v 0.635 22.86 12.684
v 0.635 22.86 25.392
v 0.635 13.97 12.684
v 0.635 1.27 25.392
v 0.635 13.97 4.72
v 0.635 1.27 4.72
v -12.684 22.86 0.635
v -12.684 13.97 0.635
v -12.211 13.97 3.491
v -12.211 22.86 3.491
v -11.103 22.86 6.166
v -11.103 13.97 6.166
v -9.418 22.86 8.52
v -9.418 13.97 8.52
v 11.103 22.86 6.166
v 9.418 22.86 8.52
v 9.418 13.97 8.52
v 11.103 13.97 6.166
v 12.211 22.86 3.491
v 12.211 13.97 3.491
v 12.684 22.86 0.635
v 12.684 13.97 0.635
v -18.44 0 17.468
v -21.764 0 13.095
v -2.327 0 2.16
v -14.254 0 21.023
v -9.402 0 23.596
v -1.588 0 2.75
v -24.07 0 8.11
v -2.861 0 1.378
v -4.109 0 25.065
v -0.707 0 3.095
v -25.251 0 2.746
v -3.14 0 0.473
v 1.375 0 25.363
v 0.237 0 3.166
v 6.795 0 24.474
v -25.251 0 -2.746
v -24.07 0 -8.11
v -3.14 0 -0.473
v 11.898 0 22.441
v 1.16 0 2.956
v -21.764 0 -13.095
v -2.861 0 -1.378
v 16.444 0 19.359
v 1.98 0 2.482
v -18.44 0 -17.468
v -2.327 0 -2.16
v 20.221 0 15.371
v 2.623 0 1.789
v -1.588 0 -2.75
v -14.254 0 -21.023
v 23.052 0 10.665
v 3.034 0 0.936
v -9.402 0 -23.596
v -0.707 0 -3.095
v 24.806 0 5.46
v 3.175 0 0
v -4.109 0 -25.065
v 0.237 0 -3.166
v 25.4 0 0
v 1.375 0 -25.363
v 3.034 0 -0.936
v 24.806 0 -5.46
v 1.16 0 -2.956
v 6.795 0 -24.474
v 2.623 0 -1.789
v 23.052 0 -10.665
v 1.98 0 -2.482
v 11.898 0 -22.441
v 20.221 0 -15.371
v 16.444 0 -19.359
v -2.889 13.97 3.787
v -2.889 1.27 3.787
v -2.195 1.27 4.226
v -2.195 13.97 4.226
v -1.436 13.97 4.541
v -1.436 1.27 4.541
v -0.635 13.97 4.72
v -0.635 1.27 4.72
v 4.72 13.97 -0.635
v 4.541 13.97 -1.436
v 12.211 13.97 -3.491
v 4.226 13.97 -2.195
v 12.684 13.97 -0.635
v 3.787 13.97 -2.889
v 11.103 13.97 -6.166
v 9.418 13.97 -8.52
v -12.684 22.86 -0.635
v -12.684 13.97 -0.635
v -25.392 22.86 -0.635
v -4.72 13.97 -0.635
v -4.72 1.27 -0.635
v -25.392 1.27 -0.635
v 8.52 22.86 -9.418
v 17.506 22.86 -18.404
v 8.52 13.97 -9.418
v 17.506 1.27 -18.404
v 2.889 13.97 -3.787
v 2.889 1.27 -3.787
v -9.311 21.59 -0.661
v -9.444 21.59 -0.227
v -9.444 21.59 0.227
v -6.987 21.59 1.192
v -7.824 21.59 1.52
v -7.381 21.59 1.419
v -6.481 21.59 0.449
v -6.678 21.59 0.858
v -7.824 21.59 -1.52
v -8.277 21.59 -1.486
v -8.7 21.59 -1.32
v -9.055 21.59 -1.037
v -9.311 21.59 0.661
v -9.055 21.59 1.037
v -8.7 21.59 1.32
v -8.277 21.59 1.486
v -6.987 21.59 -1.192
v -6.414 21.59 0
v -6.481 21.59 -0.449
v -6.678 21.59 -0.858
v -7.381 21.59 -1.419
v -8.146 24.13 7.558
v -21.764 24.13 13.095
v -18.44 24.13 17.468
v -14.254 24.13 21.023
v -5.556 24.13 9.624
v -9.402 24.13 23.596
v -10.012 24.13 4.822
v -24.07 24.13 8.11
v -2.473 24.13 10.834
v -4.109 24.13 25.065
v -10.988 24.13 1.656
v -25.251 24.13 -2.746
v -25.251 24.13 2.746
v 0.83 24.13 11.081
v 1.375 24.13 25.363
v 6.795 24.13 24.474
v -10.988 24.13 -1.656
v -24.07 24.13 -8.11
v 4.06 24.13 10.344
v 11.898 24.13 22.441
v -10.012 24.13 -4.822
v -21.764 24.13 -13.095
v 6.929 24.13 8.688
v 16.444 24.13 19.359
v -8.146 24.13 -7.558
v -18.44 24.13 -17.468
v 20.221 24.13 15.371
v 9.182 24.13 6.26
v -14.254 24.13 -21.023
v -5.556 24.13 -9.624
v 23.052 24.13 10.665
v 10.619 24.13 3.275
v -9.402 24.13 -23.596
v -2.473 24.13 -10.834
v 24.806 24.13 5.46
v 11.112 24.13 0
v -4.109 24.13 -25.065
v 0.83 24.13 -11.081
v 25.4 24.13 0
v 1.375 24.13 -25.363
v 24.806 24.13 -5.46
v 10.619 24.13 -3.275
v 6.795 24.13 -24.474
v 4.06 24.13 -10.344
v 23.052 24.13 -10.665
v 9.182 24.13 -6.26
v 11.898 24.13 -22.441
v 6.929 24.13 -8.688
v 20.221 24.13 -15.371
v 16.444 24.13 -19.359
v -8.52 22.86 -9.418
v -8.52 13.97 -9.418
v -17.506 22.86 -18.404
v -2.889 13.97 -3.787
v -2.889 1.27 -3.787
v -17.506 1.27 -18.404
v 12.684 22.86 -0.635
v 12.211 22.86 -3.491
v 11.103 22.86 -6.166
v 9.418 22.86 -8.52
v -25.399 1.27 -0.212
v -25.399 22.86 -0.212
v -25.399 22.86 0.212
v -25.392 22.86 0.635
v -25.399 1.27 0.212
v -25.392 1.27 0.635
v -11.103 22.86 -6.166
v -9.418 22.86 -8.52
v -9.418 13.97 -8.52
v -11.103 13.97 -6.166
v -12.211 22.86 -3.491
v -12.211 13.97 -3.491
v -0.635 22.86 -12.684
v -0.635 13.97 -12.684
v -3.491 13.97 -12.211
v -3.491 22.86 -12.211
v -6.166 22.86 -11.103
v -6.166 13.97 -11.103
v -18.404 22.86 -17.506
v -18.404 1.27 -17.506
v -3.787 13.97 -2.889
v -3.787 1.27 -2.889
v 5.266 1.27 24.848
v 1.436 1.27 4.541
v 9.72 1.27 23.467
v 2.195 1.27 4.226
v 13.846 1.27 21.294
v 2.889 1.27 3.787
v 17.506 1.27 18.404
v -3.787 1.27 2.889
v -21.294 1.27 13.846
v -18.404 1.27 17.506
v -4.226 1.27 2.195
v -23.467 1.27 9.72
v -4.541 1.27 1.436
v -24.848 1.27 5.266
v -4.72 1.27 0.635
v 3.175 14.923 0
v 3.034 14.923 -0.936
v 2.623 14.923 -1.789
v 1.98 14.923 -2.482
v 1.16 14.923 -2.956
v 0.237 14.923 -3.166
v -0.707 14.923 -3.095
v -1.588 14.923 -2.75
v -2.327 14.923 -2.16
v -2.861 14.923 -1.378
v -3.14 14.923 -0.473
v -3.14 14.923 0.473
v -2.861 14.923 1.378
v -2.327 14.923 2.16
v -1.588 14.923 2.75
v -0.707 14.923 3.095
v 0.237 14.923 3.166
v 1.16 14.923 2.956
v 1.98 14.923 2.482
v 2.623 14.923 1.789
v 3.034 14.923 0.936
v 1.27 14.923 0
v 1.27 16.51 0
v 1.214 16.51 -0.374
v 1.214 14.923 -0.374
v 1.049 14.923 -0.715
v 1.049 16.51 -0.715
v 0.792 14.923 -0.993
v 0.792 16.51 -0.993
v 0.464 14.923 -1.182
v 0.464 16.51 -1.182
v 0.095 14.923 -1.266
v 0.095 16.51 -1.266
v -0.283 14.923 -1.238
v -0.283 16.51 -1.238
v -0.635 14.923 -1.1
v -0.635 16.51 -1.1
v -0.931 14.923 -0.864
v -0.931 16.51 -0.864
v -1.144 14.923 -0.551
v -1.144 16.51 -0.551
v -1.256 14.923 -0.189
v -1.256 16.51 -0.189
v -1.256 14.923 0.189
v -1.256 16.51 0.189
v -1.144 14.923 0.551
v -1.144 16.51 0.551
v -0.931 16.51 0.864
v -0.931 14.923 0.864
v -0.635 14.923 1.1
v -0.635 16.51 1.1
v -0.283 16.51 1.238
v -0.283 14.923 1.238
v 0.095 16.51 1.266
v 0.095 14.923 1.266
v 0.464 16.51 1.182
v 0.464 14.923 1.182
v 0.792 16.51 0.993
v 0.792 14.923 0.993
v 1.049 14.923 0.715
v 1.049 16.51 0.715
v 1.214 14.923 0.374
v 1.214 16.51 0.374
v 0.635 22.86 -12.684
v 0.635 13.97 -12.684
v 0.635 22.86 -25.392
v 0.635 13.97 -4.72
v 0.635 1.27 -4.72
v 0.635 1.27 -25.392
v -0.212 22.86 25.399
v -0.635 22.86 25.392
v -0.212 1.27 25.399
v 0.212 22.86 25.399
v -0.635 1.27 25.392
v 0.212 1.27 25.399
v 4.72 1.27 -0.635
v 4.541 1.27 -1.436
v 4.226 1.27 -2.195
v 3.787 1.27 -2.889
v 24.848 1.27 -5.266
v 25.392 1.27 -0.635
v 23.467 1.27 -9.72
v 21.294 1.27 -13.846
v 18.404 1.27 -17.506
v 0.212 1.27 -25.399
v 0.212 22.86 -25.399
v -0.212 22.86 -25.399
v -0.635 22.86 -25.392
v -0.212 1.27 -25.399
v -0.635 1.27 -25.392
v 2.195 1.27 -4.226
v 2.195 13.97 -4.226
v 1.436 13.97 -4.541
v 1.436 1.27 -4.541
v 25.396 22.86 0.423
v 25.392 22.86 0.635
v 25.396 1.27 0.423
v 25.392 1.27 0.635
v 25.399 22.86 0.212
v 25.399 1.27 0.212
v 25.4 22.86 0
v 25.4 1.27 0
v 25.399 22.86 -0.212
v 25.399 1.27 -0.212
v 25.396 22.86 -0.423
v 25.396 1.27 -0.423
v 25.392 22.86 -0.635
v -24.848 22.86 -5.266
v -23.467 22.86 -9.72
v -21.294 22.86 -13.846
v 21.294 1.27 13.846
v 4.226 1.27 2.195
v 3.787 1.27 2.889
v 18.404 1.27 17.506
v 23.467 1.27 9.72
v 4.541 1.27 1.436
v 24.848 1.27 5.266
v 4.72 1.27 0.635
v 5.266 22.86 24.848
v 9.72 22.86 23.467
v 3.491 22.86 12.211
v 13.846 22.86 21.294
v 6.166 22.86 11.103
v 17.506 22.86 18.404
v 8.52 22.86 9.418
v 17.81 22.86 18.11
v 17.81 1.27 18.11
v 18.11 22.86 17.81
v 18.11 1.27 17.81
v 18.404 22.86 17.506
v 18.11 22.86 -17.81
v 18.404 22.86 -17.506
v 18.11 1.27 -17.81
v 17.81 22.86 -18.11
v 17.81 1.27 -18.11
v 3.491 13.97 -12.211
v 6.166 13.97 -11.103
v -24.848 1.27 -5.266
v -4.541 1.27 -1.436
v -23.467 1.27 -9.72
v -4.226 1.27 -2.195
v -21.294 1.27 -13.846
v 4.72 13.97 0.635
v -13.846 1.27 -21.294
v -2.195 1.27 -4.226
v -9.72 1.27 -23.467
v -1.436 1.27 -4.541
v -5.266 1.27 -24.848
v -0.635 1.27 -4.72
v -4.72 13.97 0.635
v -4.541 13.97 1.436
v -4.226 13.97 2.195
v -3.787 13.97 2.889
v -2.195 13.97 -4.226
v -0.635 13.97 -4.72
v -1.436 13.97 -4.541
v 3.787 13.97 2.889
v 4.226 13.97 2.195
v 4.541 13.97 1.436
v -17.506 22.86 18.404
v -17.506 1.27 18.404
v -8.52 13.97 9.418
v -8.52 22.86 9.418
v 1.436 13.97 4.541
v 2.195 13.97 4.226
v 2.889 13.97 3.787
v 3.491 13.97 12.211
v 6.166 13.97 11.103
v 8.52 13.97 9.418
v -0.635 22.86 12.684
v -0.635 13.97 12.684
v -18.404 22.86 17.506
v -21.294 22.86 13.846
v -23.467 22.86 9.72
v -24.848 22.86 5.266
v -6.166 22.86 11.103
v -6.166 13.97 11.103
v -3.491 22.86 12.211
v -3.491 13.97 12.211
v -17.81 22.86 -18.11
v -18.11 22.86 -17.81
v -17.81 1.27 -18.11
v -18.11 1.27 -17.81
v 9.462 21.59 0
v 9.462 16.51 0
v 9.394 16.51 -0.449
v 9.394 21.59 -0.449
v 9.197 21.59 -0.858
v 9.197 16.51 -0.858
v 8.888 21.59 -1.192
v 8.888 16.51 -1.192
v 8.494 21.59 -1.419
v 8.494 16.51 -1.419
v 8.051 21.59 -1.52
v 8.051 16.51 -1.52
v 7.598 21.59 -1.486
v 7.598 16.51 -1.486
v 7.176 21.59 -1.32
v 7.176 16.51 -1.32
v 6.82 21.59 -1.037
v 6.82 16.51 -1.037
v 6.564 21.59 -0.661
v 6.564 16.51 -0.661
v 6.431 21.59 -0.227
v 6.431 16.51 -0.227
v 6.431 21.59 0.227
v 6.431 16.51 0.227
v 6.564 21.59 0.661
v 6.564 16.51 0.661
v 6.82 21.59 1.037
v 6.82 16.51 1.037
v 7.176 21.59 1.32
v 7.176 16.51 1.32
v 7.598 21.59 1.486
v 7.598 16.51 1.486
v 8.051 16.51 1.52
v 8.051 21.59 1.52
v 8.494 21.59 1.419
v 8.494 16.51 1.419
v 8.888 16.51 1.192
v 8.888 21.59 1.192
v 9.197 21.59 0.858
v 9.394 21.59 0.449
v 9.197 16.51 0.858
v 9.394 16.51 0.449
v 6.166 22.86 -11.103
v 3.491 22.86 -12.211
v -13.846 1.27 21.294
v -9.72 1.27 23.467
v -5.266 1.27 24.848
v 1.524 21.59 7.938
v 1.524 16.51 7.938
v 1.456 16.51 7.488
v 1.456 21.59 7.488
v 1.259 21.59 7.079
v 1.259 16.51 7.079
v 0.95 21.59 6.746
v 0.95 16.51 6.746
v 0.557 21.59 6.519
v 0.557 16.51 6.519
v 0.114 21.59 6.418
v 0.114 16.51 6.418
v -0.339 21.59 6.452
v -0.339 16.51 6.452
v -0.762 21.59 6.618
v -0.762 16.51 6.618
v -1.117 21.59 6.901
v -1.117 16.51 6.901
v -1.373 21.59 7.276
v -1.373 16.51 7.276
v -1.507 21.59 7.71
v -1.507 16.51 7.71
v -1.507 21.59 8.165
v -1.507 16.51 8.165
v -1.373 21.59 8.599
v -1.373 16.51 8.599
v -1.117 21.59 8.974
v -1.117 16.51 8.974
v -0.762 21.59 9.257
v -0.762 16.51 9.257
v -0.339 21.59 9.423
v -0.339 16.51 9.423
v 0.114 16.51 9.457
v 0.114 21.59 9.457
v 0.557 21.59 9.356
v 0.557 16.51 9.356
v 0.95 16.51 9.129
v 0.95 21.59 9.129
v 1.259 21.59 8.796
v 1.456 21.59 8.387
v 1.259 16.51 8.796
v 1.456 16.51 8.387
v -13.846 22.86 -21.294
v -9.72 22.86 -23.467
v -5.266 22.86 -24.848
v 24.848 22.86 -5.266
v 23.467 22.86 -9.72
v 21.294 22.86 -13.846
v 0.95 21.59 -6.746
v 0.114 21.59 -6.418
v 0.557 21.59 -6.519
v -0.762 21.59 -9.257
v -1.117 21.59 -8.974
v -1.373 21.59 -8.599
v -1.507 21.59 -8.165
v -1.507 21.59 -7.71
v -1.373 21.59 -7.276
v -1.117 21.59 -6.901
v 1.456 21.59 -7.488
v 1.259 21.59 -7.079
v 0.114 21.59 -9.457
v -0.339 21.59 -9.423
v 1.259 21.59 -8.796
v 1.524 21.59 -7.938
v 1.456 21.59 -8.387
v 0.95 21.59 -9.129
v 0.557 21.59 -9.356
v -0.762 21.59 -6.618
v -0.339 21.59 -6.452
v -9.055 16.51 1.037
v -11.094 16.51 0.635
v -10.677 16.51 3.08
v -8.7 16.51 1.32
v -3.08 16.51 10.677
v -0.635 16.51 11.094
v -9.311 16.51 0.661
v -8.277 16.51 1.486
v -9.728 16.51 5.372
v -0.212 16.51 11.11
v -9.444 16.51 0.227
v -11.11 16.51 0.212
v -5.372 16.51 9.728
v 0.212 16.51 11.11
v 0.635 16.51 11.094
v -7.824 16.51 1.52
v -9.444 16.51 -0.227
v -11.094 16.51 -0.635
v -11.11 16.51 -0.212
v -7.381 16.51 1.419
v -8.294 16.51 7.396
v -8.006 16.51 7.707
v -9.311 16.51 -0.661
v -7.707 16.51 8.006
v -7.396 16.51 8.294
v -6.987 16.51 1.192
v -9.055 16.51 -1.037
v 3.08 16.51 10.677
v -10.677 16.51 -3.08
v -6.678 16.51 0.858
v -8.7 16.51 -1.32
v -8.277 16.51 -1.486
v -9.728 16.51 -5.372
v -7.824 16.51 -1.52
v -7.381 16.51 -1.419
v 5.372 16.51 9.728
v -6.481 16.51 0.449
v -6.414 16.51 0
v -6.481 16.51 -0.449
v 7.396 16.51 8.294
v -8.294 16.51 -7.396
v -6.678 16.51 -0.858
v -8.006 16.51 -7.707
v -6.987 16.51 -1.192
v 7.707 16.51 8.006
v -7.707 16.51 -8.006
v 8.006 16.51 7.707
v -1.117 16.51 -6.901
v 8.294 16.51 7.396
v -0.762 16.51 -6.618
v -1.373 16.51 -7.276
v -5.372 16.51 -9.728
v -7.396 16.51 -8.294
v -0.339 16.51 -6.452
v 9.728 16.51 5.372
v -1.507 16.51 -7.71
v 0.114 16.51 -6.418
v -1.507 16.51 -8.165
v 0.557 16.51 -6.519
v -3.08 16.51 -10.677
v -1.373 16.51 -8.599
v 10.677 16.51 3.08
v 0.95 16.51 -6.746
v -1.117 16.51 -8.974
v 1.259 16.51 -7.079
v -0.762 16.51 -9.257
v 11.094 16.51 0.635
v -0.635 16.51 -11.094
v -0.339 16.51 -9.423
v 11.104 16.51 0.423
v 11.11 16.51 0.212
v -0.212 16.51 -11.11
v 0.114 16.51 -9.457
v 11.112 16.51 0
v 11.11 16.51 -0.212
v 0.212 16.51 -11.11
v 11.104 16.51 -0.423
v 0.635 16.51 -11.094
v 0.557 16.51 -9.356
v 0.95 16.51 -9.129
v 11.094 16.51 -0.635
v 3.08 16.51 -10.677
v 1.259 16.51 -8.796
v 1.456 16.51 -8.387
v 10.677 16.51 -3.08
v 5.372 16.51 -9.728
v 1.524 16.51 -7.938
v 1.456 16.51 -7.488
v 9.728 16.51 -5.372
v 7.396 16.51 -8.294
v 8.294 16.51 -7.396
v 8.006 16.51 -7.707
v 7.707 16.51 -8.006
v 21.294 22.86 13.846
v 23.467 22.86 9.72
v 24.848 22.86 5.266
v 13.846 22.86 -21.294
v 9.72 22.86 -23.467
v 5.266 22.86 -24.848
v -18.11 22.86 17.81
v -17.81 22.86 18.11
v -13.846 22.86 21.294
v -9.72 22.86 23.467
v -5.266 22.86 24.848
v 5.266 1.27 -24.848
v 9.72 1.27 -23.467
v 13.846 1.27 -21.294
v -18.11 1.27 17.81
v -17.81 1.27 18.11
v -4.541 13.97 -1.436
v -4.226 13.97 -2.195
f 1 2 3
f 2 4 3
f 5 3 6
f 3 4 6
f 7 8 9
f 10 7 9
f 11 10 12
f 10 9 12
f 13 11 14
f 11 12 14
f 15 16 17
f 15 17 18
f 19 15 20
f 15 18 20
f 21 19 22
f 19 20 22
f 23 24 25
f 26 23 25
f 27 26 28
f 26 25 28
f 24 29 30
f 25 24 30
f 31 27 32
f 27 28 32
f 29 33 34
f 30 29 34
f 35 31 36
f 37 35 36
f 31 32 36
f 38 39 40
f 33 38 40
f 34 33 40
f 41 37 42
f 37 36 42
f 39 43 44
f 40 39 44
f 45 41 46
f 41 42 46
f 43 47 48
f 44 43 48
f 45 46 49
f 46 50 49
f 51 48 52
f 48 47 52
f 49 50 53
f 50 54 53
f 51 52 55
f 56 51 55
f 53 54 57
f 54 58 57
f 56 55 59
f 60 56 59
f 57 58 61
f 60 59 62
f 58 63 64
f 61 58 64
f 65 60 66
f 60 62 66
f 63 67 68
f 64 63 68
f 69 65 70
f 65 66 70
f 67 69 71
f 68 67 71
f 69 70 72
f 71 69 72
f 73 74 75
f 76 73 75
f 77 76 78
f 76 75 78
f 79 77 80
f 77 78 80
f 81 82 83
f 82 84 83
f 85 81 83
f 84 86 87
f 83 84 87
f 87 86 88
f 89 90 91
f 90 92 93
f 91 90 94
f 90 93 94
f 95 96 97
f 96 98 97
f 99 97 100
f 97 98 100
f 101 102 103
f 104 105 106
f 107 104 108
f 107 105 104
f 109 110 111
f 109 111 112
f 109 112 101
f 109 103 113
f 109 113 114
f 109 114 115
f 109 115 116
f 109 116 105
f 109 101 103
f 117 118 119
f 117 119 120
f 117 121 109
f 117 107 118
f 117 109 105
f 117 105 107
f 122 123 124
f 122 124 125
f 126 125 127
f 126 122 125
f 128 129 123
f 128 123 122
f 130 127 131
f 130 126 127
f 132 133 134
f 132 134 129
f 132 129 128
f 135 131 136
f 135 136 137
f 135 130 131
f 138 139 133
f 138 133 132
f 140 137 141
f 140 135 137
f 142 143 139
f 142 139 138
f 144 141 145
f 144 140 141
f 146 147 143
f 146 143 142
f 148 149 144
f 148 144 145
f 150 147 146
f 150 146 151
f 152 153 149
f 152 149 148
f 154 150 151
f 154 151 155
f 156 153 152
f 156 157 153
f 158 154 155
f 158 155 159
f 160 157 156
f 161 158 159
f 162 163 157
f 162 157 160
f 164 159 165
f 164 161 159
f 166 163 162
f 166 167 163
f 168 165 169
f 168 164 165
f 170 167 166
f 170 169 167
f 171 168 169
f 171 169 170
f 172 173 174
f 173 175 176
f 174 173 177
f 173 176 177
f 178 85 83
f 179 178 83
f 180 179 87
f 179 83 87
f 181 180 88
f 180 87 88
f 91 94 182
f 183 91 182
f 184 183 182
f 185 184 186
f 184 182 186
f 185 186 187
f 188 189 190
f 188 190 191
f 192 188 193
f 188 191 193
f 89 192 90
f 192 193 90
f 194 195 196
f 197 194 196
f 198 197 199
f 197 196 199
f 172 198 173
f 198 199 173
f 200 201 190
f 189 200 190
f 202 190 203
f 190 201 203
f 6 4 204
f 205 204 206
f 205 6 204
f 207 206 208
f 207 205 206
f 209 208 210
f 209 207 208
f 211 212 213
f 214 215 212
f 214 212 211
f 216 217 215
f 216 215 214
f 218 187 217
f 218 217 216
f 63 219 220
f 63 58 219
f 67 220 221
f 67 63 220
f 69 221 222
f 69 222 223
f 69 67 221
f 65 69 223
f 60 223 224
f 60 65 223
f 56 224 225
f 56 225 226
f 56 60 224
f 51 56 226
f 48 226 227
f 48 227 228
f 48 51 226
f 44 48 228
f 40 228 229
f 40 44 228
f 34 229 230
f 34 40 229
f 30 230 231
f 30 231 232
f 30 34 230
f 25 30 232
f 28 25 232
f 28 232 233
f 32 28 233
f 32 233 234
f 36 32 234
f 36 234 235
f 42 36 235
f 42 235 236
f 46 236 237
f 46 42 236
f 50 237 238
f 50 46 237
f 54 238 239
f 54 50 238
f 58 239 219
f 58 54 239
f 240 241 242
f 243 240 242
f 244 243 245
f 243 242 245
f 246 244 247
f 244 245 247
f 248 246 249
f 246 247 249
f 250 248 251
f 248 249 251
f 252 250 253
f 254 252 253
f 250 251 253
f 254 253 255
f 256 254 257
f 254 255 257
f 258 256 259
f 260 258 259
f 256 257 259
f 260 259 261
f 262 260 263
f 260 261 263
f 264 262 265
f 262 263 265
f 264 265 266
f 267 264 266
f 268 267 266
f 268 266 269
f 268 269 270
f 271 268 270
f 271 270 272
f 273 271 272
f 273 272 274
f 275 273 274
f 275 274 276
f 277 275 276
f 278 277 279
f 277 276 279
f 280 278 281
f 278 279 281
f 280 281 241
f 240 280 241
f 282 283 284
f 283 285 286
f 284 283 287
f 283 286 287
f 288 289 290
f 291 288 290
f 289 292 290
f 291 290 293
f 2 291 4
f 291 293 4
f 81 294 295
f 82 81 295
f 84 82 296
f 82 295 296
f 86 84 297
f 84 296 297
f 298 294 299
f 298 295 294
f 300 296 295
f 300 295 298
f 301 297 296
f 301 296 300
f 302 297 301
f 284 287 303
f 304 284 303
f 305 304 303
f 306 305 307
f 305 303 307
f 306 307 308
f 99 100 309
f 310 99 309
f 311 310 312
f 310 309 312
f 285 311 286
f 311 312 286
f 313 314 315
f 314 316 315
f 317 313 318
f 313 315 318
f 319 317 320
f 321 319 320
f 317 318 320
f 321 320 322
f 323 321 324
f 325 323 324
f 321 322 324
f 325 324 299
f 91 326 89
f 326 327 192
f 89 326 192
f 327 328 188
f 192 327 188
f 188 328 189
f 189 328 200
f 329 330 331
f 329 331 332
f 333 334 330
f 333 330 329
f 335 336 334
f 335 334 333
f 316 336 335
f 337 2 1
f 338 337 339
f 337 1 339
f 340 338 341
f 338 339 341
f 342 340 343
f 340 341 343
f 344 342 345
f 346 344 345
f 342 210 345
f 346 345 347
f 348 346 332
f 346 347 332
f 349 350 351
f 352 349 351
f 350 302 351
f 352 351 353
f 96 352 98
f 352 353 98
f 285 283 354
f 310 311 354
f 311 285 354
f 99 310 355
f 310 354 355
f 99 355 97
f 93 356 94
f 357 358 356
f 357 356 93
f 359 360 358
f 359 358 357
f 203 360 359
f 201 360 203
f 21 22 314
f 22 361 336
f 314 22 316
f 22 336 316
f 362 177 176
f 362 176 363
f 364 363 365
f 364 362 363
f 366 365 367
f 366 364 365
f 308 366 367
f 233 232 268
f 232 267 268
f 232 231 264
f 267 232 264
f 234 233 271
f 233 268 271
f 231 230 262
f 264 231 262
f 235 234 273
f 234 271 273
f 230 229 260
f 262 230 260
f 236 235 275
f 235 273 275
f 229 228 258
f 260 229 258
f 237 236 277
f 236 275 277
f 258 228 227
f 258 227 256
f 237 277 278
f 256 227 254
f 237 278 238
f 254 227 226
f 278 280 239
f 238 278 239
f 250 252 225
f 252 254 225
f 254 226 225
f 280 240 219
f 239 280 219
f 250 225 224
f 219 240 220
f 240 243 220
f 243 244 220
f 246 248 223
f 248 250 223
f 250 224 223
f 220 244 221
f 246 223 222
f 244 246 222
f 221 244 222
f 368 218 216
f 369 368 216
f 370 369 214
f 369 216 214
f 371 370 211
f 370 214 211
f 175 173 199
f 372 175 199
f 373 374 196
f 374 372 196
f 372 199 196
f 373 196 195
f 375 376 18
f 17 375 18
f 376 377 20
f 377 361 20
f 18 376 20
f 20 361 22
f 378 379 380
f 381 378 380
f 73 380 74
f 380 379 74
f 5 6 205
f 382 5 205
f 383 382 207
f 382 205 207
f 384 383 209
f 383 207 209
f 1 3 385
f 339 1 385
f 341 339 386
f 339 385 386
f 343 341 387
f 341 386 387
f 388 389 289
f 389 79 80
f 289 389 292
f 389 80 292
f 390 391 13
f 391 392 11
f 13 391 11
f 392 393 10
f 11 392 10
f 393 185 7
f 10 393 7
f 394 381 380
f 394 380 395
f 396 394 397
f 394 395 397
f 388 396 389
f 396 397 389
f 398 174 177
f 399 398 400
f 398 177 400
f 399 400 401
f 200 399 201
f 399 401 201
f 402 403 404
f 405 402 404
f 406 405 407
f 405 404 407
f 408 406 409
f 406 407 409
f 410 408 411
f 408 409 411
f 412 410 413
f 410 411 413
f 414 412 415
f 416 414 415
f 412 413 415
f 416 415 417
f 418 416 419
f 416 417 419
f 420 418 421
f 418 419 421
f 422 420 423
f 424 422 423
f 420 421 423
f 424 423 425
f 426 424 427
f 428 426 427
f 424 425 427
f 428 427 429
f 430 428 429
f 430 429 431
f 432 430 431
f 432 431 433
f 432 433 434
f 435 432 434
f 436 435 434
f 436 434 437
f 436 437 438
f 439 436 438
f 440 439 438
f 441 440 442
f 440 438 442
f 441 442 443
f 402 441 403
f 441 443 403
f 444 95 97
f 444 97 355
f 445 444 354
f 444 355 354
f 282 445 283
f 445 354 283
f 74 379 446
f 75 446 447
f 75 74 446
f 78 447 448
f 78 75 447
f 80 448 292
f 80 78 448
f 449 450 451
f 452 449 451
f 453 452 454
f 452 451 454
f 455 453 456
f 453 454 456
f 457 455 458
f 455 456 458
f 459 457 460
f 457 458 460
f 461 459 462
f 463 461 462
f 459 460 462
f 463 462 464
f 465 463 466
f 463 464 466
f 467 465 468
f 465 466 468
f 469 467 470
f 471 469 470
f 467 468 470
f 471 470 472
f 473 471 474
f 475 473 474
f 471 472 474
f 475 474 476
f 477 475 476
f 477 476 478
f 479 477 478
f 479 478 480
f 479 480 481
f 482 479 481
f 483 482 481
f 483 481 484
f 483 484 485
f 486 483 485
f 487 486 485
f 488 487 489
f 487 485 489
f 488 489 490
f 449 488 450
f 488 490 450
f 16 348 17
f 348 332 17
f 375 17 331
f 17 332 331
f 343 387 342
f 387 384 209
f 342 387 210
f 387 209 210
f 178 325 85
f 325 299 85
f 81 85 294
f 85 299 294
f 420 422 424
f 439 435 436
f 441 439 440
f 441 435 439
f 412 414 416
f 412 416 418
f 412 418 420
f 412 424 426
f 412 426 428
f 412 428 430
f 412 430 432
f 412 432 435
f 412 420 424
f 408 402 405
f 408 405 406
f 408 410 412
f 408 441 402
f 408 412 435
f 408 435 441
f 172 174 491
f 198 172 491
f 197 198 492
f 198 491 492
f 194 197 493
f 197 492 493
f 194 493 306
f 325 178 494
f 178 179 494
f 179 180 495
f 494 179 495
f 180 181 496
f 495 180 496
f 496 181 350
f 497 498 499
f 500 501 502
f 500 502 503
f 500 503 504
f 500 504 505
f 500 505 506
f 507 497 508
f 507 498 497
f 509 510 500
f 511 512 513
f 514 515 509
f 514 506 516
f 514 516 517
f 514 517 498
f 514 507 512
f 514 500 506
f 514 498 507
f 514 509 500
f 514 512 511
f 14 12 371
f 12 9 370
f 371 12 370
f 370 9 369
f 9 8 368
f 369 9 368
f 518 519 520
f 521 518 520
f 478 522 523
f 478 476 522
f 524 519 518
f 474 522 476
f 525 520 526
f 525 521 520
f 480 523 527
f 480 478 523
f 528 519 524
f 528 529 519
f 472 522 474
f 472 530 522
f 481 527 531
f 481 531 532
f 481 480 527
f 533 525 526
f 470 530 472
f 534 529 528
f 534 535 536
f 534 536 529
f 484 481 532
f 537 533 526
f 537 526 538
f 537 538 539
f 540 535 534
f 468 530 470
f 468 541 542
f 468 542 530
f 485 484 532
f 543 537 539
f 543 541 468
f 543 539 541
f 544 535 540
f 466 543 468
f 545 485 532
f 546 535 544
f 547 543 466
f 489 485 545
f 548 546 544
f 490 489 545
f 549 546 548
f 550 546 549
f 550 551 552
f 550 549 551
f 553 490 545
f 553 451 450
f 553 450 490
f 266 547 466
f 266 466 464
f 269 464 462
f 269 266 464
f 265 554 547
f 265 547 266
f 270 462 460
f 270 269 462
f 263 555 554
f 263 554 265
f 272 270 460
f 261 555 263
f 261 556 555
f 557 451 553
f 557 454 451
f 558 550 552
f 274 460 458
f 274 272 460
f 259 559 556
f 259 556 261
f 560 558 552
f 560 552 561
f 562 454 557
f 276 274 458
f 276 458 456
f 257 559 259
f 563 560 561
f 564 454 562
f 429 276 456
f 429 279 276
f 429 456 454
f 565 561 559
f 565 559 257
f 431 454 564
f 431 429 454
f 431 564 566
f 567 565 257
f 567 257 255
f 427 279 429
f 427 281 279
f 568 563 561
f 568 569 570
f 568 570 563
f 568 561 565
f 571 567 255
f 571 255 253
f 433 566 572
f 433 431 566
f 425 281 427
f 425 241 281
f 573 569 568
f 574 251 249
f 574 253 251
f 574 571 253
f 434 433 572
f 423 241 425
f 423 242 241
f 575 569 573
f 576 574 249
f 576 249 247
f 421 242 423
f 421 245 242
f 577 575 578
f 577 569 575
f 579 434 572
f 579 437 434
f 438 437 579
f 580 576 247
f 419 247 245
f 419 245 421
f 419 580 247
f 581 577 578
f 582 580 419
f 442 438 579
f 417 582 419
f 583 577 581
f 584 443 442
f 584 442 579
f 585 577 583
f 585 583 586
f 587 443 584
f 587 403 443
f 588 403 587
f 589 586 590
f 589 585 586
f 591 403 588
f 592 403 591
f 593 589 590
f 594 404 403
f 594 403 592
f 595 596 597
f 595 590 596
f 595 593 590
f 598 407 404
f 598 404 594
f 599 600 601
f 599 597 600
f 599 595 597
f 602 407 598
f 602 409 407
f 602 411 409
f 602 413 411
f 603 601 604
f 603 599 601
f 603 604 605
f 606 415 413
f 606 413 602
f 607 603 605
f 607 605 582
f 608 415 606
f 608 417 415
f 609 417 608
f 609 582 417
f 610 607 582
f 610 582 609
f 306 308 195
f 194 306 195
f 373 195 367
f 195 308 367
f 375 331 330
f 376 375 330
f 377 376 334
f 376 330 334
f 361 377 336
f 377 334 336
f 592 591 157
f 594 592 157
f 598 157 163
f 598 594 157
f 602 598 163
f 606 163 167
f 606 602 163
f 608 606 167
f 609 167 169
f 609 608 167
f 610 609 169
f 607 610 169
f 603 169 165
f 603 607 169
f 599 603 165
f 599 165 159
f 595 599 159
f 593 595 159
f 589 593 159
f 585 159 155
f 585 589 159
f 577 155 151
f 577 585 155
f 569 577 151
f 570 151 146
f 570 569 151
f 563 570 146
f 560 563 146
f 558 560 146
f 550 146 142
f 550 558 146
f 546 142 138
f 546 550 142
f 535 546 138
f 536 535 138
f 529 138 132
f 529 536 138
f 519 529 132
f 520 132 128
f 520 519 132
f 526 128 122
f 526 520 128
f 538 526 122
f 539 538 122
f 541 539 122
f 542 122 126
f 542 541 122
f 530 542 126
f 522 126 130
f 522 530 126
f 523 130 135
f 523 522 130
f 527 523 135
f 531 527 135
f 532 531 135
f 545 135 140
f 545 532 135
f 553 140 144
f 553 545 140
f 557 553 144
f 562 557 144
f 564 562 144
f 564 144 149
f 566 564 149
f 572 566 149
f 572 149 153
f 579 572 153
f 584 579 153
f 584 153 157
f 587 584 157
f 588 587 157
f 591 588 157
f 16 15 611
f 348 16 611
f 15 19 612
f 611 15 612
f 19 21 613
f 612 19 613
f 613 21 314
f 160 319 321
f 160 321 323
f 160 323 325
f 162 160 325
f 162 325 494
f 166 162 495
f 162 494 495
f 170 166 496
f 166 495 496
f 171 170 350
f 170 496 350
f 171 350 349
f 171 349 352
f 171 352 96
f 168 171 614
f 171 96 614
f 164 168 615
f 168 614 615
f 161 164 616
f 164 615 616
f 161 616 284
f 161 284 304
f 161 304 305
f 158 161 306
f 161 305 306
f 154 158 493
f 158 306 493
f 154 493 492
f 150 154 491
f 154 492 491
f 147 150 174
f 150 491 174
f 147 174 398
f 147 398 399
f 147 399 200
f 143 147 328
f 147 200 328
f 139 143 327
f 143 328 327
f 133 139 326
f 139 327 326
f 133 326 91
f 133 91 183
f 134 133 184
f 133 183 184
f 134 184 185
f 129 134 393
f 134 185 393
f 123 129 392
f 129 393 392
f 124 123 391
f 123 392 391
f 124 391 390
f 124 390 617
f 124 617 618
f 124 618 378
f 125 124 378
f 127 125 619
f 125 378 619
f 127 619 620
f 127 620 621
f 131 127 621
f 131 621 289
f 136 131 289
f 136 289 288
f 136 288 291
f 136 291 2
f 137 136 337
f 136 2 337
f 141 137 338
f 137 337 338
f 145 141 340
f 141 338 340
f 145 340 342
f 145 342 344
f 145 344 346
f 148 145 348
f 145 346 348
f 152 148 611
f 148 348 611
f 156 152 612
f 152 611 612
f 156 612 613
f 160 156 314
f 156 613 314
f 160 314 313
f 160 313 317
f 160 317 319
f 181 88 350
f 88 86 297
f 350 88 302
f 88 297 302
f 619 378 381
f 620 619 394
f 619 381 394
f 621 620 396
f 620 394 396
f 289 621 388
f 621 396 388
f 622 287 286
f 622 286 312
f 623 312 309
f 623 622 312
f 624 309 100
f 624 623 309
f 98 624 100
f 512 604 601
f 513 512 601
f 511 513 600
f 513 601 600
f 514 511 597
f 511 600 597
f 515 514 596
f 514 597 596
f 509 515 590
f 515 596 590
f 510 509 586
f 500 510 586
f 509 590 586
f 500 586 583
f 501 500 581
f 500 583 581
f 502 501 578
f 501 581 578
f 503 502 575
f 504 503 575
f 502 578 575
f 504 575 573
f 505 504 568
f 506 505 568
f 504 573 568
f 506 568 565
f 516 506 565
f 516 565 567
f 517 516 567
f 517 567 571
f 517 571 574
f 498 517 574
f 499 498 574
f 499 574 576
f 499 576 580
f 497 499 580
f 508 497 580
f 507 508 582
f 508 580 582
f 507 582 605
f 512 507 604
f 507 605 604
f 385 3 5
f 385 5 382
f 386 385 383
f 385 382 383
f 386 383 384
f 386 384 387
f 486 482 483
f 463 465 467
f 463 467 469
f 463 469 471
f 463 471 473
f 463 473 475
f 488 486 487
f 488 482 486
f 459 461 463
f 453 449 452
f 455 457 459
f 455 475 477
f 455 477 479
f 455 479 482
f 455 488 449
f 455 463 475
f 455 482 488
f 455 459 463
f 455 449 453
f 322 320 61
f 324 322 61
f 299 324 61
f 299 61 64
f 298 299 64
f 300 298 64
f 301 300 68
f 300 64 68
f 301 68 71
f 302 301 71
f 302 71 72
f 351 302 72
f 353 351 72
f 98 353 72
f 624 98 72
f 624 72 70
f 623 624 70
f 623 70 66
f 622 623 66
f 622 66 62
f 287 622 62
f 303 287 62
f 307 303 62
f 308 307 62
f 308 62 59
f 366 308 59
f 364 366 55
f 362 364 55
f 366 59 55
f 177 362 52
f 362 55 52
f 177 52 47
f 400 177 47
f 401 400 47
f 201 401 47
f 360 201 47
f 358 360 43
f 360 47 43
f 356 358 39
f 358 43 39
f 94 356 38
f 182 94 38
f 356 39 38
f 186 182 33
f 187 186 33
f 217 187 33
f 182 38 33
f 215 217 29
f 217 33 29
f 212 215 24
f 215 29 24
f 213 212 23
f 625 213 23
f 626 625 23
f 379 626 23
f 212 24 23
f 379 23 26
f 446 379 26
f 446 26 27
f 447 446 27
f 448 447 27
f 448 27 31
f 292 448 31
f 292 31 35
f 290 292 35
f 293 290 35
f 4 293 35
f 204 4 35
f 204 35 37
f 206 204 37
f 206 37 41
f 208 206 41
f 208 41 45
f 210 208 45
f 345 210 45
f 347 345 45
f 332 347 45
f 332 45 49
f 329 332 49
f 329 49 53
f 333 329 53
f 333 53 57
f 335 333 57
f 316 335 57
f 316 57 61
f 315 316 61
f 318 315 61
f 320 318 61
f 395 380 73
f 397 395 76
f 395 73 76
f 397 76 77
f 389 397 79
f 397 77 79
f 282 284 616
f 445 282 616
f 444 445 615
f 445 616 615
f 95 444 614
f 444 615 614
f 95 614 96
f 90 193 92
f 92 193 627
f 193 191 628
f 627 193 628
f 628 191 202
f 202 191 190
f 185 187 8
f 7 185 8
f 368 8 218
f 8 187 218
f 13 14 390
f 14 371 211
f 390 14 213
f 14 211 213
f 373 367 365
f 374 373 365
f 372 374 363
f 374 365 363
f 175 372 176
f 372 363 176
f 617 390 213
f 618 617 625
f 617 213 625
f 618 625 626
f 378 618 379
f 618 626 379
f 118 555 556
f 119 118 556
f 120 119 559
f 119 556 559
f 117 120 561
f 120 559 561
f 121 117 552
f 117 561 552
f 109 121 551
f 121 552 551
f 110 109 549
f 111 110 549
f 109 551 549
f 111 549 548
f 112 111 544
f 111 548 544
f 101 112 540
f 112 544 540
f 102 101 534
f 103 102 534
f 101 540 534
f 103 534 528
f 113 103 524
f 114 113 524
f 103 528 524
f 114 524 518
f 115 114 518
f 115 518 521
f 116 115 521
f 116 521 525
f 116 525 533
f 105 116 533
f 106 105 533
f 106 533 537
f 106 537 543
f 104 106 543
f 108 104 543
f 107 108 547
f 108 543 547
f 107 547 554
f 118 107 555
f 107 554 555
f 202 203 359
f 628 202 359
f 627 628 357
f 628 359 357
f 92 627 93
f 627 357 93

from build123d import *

# Parameters (mm, degrees)
SKETCH1_R            = 25.4
SKETCH1_R_2          = 3.175
BOSS_EXTRUDE1_DEPTH  = 1.27
SKETCH2_R            = 3.175
BOSS_EXTRUDE4_DEPTH  = 12.7
SKETCH5_R            = 11.1125
SKETCH5_R_2          = 3.175
BOSS_EXTRUDE6_DEPTH  = 2.54
SKETCH5_4_R          = 11.1125
BOSS_EXTRUDE7_DEPTH  = 8.89
SKETCH6_R            = 25.4
SKETCH6_R_2          = 11.1125
BOSS_EXTRUDE8_DEPTH  = 1.27
SKETCH7_R            = 1.524
BOSS_EXTRUDE9_DEPTH  = 5.08
BOSS_EXTRUDE10_START = -1.5875
SKETCH8_R            = 3.175
SKETCH8_R_2          = 1.27
BOSS_EXTRUDE10_DEPTH = 1.5875


with BuildPart() as part:
    # Sketch1 → Boss-Extrude1 (new body)
    with BuildSketch(Plane(origin=(0, 0, 0), x_dir=(1, 0, 0), z_dir=(0, 1, 0))):
        Circle(SKETCH1_R)
        Circle(SKETCH1_R_2, mode=Mode.SUBTRACT)
    extrude(amount=BOSS_EXTRUDE1_DEPTH)

    # Sketch2 → Boss-Extrude4 (add)
    with BuildSketch(Plane(origin=(0, 1.27, 0), x_dir=(1, 0, 0), z_dir=(0, 1, 0))):
        with BuildLine():
            ThreePointArc((0.635, 25.392061259), (0, 25.4), (-0.635, 25.392061259))
            Line((-0.635, 25.392061259), (-0.635, 4.719976827))
            ThreePointArc((-0.635, 4.719976827), (-1.822529847, 4.399976274), (-2.888514816, 3.786540428))
            Line((-2.888514816, 3.786540428), (-17.505885899, 18.403911511))
            ThreePointArc((-17.505885899, 18.403911511), (-17.960512242, 17.960512242), (-18.403911511, 17.505885899))
            Line((-18.403911511, 17.505885899), (-3.786540428, 2.888514816))
            ThreePointArc((-3.786540428, 2.888514816), (-4.399976274, 1.822529847), (-4.719976827, 0.635))
            Line((-4.719976827, 0.635), (-25.392061259, 0.635))
            ThreePointArc((-25.392061259, 0.635), (-25.4, 0), (-25.392061259, -0.635))
            Line((-25.392061259, -0.635), (-4.719976827, -0.635))
            ThreePointArc((-4.719976827, -0.635), (-4.399976274, -1.822529847), (-3.786540428, -2.888514816))
            Line((-3.786540428, -2.888514816), (-18.403911511, -17.505885899))
            ThreePointArc((-18.403911511, -17.505885899), (-17.960512242, -17.960512242), (-17.505885899, -18.403911511))
            Line((-17.505885899, -18.403911511), (-2.888514816, -3.786540428))
            ThreePointArc((-2.888514816, -3.786540428), (-1.822529847, -4.399976274), (-0.635, -4.719976827))
            Line((-0.635, -4.719976827), (-0.635, -25.392061259))
            ThreePointArc((-0.635, -25.392061259), (0, -25.4), (0.635, -25.392061259))
            Line((0.635, -25.392061259), (0.635, -4.719976827))
            ThreePointArc((0.635, -4.719976827), (1.822529847, -4.399976274), (2.888514816, -3.786540428))
            Line((2.888514816, -3.786540428), (17.505885899, -18.403911511))
            ThreePointArc((17.505885899, -18.403911511), (17.960512242, -17.960512242), (18.403911511, -17.505885899))
            Line((18.403911511, -17.505885899), (3.786540428, -2.888514816))
            ThreePointArc((3.786540428, -2.888514816), (4.399976274, -1.822529847), (4.719976827, -0.635))
            Line((4.719976827, -0.635), (25.392061259, -0.635))
            ThreePointArc((25.392061259, -0.635), (25.4, 0), (25.392061259, 0.635))
            Line((25.392061259, 0.635), (4.719976827, 0.635))
            ThreePointArc((4.719976827, 0.635), (4.399976274, 1.822529847), (3.786540428, 2.888514816))
            Line((3.786540428, 2.888514816), (18.403911511, 17.505885899))
            ThreePointArc((18.403911511, 17.505885899), (17.960512242, 17.960512242), (17.505885899, 18.403911511))
            Line((17.505885899, 18.403911511), (2.888514816, 3.786540428))
            ThreePointArc((2.888514816, 3.786540428), (1.822529847, 4.399976274), (0.635, 4.719976827))
            Line((0.635, 4.719976827), (0.635, 25.392061259))
        make_face()
        Circle(SKETCH2_R, mode=Mode.SUBTRACT)
    extrude(amount=BOSS_EXTRUDE4_DEPTH)

    # Sketch5 → Boss-Extrude6 (add)
    with BuildSketch(Plane(origin=(0, 13.97, 0), x_dir=(1, 0, 0), z_dir=(0, 1, 0))):
        Circle(SKETCH5_R)
        Circle(SKETCH5_R_2, mode=Mode.SUBTRACT)
    extrude(amount=BOSS_EXTRUDE6_DEPTH)

    # Sketch5<4> → Boss-Extrude7 (add)
    with BuildSketch(Plane(origin=(0, 13.97, 0), x_dir=(1, 0, 0), z_dir=(0, 1, 0))):
        with BuildLine():
            ThreePointArc((0.635, -12.684115066), (4.860079591, -11.733270063), (8.52001097, -9.418036582))
            Line((8.52001097, -9.418036582), (17.505885899, -18.403911511))
            ThreePointArc((17.505885899, -18.403911511), (17.960512242, -17.960512242), (18.403911511, -17.505885899))
            Line((18.403911511, -17.505885899), (9.418036582, -8.52001097))
            ThreePointArc((9.418036582, -8.52001097), (11.733270063, -4.860079591), (12.684115066, -0.635))
            Line((12.684115066, -0.635), (25.392061259, -0.635))
            ThreePointArc((25.392061259, -0.635), (25.4, 0), (25.392061259, 0.635))
            Line((25.392061259, 0.635), (12.684115066, 0.635))
            ThreePointArc((12.684115066, 0.635), (11.733270063, 4.860079591), (9.418036582, 8.52001097))
            Line((9.418036582, 8.52001097), (18.403911511, 17.505885899))
            ThreePointArc((18.403911511, 17.505885899), (17.960512242, 17.960512242), (17.505885899, 18.403911511))
            Line((17.505885899, 18.403911511), (8.52001097, 9.418036582))
            ThreePointArc((8.52001097, 9.418036582), (4.860079591, 11.733270063), (0.635, 12.684115066))
            Line((0.635, 12.684115066), (0.635, 25.392061259))
            ThreePointArc((0.635, 25.392061259), (0, 25.4), (-0.635, 25.392061259))
            Line((-0.635, 25.392061259), (-0.635, 12.684115066))
            ThreePointArc((-0.635, 12.684115066), (-4.860079591, 11.733270063), (-8.52001097, 9.418036582))
            Line((-8.52001097, 9.418036582), (-17.505885899, 18.403911511))
            ThreePointArc((-17.505885899, 18.403911511), (-17.960512242, 17.960512242), (-18.403911511, 17.505885899))
            Line((-18.403911511, 17.505885899), (-9.418036582, 8.52001097))
            ThreePointArc((-9.418036582, 8.52001097), (-11.733270063, 4.860079591), (-12.684115066, 0.635))
            Line((-12.684115066, 0.635), (-25.392061259, 0.635))
            ThreePointArc((-25.392061259, 0.635), (-25.4, 0), (-25.392061259, -0.635))
            Line((-25.392061259, -0.635), (-12.684115066, -0.635))
            ThreePointArc((-12.684115066, -0.635), (-11.733270063, -4.860079591), (-9.418036582, -8.52001097))
            Line((-9.418036582, -8.52001097), (-18.403911511, -17.505885899))
            ThreePointArc((-18.403911511, -17.505885899), (-17.960512242, -17.960512242), (-17.505885899, -18.403911511))
            Line((-17.505885899, -18.403911511), (-8.52001097, -9.418036582))
            ThreePointArc((-8.52001097, -9.418036582), (-4.860079591, -11.733270063), (-0.635, -12.684115066))
            Line((-0.635, -12.684115066), (-0.635, -25.392061259))
            ThreePointArc((-0.635, -25.392061259), (0, -25.4), (0.635, -25.392061259))
            Line((0.635, -25.392061259), (0.635, -12.684115066))
        make_face()
        Circle(SKETCH5_4_R, mode=Mode.SUBTRACT)
    extrude(amount=BOSS_EXTRUDE7_DEPTH)

    # Sketch6 → Boss-Extrude8 (add)
    with BuildSketch(Plane(origin=(0, 22.86, 0), x_dir=(1, 0, 0), z_dir=(0, 1, 0))):
        Circle(SKETCH6_R)
        Circle(SKETCH6_R_2, mode=Mode.SUBTRACT)
    extrude(amount=BOSS_EXTRUDE8_DEPTH)

    # Sketch7 → Boss-Extrude9 (add)
    with BuildSketch(Plane(origin=(0, 16.51, 0), x_dir=(1, 0, 0), z_dir=(0, 1, 0))):
        with Locations((7.9375, 0)):
            Circle(SKETCH7_R)
        with Locations((0, -7.9375)):
            Circle(SKETCH7_R)
        with Locations((-7.9375, 0)):
            Circle(SKETCH7_R)
        with Locations((0, 7.9375)):
            Circle(SKETCH7_R)
    extrude(amount=BOSS_EXTRUDE9_DEPTH)

    # Sketch8 → Boss-Extrude10 (add)
    with BuildSketch(Plane(origin=(0, 16.51, 0), x_dir=(1, 0, 0), z_dir=(0, 1, 0)).offset(BOSS_EXTRUDE10_START)):
        Circle(SKETCH8_R)
        Circle(SKETCH8_R_2, mode=Mode.SUBTRACT)
    extrude(amount=BOSS_EXTRUDE10_DEPTH)


solid = part.part
